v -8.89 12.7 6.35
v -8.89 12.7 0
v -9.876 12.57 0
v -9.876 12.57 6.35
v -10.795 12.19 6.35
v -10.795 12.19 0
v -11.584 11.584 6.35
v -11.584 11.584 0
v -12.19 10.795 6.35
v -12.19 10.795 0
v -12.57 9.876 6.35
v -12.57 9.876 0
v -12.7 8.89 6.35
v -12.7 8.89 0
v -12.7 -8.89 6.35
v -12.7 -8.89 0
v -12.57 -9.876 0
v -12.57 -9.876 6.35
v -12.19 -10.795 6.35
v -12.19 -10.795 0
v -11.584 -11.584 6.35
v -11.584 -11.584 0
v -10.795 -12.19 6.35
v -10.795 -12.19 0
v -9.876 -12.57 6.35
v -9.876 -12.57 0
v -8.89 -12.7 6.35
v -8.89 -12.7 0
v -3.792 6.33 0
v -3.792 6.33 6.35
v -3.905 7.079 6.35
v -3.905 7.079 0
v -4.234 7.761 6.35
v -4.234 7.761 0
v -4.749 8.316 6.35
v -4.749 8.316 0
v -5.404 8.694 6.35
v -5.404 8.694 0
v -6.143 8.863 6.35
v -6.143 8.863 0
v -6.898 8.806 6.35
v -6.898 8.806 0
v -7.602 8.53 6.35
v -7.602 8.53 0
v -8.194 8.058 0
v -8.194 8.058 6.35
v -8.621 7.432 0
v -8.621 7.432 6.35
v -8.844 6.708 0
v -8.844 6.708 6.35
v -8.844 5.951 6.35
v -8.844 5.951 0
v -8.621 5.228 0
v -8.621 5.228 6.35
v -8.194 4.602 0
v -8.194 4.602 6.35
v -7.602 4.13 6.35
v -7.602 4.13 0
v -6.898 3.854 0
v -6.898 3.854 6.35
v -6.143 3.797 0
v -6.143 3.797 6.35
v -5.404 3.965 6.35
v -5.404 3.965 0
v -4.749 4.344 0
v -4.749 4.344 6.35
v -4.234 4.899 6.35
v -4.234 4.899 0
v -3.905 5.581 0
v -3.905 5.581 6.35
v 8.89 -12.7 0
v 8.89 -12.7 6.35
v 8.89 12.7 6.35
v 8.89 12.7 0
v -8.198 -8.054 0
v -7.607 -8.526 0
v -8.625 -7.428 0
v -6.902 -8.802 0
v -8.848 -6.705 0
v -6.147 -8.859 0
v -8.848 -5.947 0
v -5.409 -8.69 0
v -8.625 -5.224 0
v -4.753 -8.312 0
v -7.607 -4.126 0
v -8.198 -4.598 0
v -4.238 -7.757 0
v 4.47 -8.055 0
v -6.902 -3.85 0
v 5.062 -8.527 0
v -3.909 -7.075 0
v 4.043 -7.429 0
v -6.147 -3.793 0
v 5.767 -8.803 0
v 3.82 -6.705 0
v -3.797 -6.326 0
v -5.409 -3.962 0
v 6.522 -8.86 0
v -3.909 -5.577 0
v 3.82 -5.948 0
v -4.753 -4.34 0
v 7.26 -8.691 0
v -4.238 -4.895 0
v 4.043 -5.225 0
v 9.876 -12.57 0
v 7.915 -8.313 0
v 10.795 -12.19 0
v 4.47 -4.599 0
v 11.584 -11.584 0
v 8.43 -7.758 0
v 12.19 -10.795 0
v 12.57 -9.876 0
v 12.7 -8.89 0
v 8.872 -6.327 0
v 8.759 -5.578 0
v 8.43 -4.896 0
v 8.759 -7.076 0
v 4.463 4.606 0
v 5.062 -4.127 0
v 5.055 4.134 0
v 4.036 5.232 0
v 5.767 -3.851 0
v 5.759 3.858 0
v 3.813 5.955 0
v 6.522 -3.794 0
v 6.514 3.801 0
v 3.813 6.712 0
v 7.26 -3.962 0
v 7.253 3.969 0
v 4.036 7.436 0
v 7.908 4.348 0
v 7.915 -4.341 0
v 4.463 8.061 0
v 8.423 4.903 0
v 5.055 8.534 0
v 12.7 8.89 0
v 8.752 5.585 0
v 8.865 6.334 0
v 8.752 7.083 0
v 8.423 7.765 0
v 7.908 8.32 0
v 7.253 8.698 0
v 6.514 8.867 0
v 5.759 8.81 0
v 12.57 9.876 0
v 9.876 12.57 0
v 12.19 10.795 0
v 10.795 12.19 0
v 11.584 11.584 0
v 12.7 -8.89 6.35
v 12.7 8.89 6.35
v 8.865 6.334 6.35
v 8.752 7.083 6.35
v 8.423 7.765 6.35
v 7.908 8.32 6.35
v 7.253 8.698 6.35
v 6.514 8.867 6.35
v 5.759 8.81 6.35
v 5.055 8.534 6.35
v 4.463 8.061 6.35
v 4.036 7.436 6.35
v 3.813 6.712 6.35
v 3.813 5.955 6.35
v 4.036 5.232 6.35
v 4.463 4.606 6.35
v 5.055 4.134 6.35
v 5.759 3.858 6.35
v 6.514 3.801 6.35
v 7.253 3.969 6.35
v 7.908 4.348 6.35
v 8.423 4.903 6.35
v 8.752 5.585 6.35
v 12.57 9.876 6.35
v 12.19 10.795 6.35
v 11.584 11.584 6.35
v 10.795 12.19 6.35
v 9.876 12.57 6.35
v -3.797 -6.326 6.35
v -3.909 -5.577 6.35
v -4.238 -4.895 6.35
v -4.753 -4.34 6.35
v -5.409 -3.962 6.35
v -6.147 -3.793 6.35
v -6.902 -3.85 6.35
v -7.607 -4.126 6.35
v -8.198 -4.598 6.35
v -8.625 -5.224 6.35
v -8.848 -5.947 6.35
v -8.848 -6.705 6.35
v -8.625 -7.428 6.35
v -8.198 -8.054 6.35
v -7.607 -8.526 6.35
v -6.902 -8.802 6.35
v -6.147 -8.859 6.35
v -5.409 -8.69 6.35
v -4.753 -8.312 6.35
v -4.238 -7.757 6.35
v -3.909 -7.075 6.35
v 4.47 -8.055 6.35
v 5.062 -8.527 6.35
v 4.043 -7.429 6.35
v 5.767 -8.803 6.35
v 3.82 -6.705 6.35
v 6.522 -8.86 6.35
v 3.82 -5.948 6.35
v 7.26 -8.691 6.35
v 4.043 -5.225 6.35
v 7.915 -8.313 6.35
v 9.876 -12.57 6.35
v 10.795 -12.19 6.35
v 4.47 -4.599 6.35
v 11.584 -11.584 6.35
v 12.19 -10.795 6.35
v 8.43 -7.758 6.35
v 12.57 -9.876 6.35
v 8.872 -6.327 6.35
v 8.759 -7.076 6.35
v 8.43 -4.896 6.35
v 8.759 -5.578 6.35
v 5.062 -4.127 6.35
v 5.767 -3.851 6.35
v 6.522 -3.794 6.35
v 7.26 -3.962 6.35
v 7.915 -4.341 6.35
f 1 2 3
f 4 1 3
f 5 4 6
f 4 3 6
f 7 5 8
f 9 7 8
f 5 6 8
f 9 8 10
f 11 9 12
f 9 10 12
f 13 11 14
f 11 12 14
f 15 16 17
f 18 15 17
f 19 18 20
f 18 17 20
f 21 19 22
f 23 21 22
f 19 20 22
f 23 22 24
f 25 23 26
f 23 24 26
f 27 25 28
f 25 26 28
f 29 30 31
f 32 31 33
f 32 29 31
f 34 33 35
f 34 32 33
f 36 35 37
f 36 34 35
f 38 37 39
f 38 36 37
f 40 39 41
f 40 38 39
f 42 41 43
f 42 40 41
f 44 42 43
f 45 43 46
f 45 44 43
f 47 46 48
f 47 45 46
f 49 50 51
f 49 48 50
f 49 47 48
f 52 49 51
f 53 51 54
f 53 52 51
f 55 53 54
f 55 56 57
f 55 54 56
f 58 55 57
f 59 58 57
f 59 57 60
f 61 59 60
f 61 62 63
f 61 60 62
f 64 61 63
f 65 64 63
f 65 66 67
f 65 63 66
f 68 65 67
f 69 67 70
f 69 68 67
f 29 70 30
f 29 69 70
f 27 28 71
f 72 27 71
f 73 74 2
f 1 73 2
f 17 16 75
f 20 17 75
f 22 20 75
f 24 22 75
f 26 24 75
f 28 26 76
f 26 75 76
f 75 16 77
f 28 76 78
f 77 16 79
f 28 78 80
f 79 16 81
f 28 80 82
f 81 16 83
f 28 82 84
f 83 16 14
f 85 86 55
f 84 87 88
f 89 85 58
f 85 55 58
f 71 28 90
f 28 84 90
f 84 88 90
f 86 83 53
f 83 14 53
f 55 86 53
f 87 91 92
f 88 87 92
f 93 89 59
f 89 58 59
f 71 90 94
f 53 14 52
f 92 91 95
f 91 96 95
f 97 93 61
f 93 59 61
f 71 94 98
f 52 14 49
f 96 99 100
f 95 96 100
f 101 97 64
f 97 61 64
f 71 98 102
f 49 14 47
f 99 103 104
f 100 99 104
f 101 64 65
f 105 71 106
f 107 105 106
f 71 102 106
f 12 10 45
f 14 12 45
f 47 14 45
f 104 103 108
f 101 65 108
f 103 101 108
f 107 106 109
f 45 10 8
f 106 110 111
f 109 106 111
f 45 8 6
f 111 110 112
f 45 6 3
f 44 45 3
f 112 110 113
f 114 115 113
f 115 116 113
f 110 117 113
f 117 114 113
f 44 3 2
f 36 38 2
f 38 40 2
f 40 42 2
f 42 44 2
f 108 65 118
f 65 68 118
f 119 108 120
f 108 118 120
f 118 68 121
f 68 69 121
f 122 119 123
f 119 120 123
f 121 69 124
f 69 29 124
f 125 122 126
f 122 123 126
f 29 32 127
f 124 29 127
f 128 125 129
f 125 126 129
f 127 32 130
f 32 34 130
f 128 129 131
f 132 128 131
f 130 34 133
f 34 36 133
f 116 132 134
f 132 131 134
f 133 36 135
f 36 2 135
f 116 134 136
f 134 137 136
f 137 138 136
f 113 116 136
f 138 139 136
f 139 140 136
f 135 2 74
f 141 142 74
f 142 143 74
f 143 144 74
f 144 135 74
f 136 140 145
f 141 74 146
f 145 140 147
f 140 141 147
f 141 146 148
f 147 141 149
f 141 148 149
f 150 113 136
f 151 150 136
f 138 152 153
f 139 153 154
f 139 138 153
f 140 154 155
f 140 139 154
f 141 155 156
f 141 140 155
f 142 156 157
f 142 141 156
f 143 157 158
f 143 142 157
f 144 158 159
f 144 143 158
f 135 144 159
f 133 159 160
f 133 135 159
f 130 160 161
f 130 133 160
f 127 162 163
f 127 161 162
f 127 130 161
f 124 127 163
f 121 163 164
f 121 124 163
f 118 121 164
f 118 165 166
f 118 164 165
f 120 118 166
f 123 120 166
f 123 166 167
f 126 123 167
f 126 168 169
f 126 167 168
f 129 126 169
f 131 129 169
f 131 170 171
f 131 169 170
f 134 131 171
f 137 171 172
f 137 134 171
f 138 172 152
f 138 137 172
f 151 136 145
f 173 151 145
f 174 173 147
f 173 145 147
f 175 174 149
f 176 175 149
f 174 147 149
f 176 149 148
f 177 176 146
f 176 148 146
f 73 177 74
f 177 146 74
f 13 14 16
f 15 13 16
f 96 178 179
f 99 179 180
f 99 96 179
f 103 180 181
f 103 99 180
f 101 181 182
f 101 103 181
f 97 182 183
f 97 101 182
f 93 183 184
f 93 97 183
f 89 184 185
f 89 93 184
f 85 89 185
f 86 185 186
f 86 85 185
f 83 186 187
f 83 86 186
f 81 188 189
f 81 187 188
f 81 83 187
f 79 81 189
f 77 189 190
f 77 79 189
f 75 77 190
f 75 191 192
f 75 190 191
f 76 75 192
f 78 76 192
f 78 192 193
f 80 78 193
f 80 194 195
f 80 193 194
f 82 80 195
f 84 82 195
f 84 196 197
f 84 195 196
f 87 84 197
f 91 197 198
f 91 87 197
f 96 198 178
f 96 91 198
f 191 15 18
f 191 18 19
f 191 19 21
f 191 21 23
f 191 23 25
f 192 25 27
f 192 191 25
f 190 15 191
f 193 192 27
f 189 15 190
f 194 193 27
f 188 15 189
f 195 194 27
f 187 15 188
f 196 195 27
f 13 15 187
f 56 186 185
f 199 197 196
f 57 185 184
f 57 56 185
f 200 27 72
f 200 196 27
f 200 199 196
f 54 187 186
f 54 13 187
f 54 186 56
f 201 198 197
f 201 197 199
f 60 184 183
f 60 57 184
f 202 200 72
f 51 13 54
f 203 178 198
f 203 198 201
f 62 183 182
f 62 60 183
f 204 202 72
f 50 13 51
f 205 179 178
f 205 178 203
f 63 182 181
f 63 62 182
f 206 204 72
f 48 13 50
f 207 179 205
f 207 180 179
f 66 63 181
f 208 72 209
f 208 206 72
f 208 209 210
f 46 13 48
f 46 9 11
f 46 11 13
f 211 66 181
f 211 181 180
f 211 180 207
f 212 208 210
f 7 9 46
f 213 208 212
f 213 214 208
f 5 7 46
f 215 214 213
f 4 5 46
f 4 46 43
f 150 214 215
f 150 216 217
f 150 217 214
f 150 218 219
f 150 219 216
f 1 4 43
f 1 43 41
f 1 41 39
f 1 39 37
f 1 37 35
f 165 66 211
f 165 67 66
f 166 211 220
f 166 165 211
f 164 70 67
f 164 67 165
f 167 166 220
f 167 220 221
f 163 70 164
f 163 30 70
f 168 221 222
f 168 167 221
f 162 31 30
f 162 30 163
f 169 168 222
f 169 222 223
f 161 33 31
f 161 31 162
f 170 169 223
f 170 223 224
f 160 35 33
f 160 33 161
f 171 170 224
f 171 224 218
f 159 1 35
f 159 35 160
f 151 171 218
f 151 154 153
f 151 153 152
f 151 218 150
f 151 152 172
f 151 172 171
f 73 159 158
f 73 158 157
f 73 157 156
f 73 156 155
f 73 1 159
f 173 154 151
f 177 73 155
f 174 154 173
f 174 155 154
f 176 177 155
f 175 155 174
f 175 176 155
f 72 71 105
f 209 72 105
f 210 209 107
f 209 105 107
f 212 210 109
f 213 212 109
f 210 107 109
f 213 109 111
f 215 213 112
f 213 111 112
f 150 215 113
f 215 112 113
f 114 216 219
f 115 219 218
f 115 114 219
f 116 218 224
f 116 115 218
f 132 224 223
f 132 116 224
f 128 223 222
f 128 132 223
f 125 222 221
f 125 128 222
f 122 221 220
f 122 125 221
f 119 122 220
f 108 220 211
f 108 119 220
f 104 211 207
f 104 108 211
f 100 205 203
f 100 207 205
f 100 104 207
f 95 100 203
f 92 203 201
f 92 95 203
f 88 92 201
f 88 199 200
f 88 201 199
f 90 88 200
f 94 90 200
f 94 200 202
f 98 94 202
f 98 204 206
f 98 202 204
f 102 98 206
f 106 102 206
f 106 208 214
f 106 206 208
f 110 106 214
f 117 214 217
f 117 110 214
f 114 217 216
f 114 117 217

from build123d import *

# Parameters (mm, degrees)
F1_DEPTH      = 6.35
F2_R          = 2.54
F3_DEPTH      = 25.4
F3_DEPTH_BACK = 25.4


with BuildPart() as f1:
    # F0 (on Top) → F1 (new body)
    with BuildSketch(Plane.XY):
        with BuildLine():
            Line((-8.89, -12.7), (8.89, -12.7))
            ThreePointArc((8.89, -12.7), (11.584077, -11.584077), (12.7, -8.89))
            Line((12.7, -8.89), (12.7, 8.89))
            ThreePointArc((12.7, 8.89), (11.584077, 11.584077), (8.89, 12.7))
            Line((8.89, 12.7), (-8.89, 12.7))
            ThreePointArc((-8.89, 12.7), (-11.584077, 11.584077), (-12.7, 8.89))
            Line((-12.7, 8.89), (-12.7, -8.89))
            ThreePointArc((-12.7, -8.89), (-11.584077, -11.584077), (-8.89, -12.7))
        make_face()
    extrude(amount=F1_DEPTH)

    # F2 (on Top) → F3 (cut, two sides)
    with BuildSketch(Plane.XY) as f3_sk:
        with Locations((-6.336518, -6.325952)):
            Circle(F2_R)
        with Locations((6.331818, -6.326862)):
            Circle(F2_R)
        with Locations((6.324662, 6.333847)):
            Circle(F2_R)
        with Locations((-6.33241, 6.329887)):
            Circle(F2_R)
    extrude(amount=F3_DEPTH, mode=Mode.SUBTRACT)
    extrude(f3_sk.sketch, amount=-F3_DEPTH_BACK, mode=Mode.SUBTRACT)


solid = f1.part
